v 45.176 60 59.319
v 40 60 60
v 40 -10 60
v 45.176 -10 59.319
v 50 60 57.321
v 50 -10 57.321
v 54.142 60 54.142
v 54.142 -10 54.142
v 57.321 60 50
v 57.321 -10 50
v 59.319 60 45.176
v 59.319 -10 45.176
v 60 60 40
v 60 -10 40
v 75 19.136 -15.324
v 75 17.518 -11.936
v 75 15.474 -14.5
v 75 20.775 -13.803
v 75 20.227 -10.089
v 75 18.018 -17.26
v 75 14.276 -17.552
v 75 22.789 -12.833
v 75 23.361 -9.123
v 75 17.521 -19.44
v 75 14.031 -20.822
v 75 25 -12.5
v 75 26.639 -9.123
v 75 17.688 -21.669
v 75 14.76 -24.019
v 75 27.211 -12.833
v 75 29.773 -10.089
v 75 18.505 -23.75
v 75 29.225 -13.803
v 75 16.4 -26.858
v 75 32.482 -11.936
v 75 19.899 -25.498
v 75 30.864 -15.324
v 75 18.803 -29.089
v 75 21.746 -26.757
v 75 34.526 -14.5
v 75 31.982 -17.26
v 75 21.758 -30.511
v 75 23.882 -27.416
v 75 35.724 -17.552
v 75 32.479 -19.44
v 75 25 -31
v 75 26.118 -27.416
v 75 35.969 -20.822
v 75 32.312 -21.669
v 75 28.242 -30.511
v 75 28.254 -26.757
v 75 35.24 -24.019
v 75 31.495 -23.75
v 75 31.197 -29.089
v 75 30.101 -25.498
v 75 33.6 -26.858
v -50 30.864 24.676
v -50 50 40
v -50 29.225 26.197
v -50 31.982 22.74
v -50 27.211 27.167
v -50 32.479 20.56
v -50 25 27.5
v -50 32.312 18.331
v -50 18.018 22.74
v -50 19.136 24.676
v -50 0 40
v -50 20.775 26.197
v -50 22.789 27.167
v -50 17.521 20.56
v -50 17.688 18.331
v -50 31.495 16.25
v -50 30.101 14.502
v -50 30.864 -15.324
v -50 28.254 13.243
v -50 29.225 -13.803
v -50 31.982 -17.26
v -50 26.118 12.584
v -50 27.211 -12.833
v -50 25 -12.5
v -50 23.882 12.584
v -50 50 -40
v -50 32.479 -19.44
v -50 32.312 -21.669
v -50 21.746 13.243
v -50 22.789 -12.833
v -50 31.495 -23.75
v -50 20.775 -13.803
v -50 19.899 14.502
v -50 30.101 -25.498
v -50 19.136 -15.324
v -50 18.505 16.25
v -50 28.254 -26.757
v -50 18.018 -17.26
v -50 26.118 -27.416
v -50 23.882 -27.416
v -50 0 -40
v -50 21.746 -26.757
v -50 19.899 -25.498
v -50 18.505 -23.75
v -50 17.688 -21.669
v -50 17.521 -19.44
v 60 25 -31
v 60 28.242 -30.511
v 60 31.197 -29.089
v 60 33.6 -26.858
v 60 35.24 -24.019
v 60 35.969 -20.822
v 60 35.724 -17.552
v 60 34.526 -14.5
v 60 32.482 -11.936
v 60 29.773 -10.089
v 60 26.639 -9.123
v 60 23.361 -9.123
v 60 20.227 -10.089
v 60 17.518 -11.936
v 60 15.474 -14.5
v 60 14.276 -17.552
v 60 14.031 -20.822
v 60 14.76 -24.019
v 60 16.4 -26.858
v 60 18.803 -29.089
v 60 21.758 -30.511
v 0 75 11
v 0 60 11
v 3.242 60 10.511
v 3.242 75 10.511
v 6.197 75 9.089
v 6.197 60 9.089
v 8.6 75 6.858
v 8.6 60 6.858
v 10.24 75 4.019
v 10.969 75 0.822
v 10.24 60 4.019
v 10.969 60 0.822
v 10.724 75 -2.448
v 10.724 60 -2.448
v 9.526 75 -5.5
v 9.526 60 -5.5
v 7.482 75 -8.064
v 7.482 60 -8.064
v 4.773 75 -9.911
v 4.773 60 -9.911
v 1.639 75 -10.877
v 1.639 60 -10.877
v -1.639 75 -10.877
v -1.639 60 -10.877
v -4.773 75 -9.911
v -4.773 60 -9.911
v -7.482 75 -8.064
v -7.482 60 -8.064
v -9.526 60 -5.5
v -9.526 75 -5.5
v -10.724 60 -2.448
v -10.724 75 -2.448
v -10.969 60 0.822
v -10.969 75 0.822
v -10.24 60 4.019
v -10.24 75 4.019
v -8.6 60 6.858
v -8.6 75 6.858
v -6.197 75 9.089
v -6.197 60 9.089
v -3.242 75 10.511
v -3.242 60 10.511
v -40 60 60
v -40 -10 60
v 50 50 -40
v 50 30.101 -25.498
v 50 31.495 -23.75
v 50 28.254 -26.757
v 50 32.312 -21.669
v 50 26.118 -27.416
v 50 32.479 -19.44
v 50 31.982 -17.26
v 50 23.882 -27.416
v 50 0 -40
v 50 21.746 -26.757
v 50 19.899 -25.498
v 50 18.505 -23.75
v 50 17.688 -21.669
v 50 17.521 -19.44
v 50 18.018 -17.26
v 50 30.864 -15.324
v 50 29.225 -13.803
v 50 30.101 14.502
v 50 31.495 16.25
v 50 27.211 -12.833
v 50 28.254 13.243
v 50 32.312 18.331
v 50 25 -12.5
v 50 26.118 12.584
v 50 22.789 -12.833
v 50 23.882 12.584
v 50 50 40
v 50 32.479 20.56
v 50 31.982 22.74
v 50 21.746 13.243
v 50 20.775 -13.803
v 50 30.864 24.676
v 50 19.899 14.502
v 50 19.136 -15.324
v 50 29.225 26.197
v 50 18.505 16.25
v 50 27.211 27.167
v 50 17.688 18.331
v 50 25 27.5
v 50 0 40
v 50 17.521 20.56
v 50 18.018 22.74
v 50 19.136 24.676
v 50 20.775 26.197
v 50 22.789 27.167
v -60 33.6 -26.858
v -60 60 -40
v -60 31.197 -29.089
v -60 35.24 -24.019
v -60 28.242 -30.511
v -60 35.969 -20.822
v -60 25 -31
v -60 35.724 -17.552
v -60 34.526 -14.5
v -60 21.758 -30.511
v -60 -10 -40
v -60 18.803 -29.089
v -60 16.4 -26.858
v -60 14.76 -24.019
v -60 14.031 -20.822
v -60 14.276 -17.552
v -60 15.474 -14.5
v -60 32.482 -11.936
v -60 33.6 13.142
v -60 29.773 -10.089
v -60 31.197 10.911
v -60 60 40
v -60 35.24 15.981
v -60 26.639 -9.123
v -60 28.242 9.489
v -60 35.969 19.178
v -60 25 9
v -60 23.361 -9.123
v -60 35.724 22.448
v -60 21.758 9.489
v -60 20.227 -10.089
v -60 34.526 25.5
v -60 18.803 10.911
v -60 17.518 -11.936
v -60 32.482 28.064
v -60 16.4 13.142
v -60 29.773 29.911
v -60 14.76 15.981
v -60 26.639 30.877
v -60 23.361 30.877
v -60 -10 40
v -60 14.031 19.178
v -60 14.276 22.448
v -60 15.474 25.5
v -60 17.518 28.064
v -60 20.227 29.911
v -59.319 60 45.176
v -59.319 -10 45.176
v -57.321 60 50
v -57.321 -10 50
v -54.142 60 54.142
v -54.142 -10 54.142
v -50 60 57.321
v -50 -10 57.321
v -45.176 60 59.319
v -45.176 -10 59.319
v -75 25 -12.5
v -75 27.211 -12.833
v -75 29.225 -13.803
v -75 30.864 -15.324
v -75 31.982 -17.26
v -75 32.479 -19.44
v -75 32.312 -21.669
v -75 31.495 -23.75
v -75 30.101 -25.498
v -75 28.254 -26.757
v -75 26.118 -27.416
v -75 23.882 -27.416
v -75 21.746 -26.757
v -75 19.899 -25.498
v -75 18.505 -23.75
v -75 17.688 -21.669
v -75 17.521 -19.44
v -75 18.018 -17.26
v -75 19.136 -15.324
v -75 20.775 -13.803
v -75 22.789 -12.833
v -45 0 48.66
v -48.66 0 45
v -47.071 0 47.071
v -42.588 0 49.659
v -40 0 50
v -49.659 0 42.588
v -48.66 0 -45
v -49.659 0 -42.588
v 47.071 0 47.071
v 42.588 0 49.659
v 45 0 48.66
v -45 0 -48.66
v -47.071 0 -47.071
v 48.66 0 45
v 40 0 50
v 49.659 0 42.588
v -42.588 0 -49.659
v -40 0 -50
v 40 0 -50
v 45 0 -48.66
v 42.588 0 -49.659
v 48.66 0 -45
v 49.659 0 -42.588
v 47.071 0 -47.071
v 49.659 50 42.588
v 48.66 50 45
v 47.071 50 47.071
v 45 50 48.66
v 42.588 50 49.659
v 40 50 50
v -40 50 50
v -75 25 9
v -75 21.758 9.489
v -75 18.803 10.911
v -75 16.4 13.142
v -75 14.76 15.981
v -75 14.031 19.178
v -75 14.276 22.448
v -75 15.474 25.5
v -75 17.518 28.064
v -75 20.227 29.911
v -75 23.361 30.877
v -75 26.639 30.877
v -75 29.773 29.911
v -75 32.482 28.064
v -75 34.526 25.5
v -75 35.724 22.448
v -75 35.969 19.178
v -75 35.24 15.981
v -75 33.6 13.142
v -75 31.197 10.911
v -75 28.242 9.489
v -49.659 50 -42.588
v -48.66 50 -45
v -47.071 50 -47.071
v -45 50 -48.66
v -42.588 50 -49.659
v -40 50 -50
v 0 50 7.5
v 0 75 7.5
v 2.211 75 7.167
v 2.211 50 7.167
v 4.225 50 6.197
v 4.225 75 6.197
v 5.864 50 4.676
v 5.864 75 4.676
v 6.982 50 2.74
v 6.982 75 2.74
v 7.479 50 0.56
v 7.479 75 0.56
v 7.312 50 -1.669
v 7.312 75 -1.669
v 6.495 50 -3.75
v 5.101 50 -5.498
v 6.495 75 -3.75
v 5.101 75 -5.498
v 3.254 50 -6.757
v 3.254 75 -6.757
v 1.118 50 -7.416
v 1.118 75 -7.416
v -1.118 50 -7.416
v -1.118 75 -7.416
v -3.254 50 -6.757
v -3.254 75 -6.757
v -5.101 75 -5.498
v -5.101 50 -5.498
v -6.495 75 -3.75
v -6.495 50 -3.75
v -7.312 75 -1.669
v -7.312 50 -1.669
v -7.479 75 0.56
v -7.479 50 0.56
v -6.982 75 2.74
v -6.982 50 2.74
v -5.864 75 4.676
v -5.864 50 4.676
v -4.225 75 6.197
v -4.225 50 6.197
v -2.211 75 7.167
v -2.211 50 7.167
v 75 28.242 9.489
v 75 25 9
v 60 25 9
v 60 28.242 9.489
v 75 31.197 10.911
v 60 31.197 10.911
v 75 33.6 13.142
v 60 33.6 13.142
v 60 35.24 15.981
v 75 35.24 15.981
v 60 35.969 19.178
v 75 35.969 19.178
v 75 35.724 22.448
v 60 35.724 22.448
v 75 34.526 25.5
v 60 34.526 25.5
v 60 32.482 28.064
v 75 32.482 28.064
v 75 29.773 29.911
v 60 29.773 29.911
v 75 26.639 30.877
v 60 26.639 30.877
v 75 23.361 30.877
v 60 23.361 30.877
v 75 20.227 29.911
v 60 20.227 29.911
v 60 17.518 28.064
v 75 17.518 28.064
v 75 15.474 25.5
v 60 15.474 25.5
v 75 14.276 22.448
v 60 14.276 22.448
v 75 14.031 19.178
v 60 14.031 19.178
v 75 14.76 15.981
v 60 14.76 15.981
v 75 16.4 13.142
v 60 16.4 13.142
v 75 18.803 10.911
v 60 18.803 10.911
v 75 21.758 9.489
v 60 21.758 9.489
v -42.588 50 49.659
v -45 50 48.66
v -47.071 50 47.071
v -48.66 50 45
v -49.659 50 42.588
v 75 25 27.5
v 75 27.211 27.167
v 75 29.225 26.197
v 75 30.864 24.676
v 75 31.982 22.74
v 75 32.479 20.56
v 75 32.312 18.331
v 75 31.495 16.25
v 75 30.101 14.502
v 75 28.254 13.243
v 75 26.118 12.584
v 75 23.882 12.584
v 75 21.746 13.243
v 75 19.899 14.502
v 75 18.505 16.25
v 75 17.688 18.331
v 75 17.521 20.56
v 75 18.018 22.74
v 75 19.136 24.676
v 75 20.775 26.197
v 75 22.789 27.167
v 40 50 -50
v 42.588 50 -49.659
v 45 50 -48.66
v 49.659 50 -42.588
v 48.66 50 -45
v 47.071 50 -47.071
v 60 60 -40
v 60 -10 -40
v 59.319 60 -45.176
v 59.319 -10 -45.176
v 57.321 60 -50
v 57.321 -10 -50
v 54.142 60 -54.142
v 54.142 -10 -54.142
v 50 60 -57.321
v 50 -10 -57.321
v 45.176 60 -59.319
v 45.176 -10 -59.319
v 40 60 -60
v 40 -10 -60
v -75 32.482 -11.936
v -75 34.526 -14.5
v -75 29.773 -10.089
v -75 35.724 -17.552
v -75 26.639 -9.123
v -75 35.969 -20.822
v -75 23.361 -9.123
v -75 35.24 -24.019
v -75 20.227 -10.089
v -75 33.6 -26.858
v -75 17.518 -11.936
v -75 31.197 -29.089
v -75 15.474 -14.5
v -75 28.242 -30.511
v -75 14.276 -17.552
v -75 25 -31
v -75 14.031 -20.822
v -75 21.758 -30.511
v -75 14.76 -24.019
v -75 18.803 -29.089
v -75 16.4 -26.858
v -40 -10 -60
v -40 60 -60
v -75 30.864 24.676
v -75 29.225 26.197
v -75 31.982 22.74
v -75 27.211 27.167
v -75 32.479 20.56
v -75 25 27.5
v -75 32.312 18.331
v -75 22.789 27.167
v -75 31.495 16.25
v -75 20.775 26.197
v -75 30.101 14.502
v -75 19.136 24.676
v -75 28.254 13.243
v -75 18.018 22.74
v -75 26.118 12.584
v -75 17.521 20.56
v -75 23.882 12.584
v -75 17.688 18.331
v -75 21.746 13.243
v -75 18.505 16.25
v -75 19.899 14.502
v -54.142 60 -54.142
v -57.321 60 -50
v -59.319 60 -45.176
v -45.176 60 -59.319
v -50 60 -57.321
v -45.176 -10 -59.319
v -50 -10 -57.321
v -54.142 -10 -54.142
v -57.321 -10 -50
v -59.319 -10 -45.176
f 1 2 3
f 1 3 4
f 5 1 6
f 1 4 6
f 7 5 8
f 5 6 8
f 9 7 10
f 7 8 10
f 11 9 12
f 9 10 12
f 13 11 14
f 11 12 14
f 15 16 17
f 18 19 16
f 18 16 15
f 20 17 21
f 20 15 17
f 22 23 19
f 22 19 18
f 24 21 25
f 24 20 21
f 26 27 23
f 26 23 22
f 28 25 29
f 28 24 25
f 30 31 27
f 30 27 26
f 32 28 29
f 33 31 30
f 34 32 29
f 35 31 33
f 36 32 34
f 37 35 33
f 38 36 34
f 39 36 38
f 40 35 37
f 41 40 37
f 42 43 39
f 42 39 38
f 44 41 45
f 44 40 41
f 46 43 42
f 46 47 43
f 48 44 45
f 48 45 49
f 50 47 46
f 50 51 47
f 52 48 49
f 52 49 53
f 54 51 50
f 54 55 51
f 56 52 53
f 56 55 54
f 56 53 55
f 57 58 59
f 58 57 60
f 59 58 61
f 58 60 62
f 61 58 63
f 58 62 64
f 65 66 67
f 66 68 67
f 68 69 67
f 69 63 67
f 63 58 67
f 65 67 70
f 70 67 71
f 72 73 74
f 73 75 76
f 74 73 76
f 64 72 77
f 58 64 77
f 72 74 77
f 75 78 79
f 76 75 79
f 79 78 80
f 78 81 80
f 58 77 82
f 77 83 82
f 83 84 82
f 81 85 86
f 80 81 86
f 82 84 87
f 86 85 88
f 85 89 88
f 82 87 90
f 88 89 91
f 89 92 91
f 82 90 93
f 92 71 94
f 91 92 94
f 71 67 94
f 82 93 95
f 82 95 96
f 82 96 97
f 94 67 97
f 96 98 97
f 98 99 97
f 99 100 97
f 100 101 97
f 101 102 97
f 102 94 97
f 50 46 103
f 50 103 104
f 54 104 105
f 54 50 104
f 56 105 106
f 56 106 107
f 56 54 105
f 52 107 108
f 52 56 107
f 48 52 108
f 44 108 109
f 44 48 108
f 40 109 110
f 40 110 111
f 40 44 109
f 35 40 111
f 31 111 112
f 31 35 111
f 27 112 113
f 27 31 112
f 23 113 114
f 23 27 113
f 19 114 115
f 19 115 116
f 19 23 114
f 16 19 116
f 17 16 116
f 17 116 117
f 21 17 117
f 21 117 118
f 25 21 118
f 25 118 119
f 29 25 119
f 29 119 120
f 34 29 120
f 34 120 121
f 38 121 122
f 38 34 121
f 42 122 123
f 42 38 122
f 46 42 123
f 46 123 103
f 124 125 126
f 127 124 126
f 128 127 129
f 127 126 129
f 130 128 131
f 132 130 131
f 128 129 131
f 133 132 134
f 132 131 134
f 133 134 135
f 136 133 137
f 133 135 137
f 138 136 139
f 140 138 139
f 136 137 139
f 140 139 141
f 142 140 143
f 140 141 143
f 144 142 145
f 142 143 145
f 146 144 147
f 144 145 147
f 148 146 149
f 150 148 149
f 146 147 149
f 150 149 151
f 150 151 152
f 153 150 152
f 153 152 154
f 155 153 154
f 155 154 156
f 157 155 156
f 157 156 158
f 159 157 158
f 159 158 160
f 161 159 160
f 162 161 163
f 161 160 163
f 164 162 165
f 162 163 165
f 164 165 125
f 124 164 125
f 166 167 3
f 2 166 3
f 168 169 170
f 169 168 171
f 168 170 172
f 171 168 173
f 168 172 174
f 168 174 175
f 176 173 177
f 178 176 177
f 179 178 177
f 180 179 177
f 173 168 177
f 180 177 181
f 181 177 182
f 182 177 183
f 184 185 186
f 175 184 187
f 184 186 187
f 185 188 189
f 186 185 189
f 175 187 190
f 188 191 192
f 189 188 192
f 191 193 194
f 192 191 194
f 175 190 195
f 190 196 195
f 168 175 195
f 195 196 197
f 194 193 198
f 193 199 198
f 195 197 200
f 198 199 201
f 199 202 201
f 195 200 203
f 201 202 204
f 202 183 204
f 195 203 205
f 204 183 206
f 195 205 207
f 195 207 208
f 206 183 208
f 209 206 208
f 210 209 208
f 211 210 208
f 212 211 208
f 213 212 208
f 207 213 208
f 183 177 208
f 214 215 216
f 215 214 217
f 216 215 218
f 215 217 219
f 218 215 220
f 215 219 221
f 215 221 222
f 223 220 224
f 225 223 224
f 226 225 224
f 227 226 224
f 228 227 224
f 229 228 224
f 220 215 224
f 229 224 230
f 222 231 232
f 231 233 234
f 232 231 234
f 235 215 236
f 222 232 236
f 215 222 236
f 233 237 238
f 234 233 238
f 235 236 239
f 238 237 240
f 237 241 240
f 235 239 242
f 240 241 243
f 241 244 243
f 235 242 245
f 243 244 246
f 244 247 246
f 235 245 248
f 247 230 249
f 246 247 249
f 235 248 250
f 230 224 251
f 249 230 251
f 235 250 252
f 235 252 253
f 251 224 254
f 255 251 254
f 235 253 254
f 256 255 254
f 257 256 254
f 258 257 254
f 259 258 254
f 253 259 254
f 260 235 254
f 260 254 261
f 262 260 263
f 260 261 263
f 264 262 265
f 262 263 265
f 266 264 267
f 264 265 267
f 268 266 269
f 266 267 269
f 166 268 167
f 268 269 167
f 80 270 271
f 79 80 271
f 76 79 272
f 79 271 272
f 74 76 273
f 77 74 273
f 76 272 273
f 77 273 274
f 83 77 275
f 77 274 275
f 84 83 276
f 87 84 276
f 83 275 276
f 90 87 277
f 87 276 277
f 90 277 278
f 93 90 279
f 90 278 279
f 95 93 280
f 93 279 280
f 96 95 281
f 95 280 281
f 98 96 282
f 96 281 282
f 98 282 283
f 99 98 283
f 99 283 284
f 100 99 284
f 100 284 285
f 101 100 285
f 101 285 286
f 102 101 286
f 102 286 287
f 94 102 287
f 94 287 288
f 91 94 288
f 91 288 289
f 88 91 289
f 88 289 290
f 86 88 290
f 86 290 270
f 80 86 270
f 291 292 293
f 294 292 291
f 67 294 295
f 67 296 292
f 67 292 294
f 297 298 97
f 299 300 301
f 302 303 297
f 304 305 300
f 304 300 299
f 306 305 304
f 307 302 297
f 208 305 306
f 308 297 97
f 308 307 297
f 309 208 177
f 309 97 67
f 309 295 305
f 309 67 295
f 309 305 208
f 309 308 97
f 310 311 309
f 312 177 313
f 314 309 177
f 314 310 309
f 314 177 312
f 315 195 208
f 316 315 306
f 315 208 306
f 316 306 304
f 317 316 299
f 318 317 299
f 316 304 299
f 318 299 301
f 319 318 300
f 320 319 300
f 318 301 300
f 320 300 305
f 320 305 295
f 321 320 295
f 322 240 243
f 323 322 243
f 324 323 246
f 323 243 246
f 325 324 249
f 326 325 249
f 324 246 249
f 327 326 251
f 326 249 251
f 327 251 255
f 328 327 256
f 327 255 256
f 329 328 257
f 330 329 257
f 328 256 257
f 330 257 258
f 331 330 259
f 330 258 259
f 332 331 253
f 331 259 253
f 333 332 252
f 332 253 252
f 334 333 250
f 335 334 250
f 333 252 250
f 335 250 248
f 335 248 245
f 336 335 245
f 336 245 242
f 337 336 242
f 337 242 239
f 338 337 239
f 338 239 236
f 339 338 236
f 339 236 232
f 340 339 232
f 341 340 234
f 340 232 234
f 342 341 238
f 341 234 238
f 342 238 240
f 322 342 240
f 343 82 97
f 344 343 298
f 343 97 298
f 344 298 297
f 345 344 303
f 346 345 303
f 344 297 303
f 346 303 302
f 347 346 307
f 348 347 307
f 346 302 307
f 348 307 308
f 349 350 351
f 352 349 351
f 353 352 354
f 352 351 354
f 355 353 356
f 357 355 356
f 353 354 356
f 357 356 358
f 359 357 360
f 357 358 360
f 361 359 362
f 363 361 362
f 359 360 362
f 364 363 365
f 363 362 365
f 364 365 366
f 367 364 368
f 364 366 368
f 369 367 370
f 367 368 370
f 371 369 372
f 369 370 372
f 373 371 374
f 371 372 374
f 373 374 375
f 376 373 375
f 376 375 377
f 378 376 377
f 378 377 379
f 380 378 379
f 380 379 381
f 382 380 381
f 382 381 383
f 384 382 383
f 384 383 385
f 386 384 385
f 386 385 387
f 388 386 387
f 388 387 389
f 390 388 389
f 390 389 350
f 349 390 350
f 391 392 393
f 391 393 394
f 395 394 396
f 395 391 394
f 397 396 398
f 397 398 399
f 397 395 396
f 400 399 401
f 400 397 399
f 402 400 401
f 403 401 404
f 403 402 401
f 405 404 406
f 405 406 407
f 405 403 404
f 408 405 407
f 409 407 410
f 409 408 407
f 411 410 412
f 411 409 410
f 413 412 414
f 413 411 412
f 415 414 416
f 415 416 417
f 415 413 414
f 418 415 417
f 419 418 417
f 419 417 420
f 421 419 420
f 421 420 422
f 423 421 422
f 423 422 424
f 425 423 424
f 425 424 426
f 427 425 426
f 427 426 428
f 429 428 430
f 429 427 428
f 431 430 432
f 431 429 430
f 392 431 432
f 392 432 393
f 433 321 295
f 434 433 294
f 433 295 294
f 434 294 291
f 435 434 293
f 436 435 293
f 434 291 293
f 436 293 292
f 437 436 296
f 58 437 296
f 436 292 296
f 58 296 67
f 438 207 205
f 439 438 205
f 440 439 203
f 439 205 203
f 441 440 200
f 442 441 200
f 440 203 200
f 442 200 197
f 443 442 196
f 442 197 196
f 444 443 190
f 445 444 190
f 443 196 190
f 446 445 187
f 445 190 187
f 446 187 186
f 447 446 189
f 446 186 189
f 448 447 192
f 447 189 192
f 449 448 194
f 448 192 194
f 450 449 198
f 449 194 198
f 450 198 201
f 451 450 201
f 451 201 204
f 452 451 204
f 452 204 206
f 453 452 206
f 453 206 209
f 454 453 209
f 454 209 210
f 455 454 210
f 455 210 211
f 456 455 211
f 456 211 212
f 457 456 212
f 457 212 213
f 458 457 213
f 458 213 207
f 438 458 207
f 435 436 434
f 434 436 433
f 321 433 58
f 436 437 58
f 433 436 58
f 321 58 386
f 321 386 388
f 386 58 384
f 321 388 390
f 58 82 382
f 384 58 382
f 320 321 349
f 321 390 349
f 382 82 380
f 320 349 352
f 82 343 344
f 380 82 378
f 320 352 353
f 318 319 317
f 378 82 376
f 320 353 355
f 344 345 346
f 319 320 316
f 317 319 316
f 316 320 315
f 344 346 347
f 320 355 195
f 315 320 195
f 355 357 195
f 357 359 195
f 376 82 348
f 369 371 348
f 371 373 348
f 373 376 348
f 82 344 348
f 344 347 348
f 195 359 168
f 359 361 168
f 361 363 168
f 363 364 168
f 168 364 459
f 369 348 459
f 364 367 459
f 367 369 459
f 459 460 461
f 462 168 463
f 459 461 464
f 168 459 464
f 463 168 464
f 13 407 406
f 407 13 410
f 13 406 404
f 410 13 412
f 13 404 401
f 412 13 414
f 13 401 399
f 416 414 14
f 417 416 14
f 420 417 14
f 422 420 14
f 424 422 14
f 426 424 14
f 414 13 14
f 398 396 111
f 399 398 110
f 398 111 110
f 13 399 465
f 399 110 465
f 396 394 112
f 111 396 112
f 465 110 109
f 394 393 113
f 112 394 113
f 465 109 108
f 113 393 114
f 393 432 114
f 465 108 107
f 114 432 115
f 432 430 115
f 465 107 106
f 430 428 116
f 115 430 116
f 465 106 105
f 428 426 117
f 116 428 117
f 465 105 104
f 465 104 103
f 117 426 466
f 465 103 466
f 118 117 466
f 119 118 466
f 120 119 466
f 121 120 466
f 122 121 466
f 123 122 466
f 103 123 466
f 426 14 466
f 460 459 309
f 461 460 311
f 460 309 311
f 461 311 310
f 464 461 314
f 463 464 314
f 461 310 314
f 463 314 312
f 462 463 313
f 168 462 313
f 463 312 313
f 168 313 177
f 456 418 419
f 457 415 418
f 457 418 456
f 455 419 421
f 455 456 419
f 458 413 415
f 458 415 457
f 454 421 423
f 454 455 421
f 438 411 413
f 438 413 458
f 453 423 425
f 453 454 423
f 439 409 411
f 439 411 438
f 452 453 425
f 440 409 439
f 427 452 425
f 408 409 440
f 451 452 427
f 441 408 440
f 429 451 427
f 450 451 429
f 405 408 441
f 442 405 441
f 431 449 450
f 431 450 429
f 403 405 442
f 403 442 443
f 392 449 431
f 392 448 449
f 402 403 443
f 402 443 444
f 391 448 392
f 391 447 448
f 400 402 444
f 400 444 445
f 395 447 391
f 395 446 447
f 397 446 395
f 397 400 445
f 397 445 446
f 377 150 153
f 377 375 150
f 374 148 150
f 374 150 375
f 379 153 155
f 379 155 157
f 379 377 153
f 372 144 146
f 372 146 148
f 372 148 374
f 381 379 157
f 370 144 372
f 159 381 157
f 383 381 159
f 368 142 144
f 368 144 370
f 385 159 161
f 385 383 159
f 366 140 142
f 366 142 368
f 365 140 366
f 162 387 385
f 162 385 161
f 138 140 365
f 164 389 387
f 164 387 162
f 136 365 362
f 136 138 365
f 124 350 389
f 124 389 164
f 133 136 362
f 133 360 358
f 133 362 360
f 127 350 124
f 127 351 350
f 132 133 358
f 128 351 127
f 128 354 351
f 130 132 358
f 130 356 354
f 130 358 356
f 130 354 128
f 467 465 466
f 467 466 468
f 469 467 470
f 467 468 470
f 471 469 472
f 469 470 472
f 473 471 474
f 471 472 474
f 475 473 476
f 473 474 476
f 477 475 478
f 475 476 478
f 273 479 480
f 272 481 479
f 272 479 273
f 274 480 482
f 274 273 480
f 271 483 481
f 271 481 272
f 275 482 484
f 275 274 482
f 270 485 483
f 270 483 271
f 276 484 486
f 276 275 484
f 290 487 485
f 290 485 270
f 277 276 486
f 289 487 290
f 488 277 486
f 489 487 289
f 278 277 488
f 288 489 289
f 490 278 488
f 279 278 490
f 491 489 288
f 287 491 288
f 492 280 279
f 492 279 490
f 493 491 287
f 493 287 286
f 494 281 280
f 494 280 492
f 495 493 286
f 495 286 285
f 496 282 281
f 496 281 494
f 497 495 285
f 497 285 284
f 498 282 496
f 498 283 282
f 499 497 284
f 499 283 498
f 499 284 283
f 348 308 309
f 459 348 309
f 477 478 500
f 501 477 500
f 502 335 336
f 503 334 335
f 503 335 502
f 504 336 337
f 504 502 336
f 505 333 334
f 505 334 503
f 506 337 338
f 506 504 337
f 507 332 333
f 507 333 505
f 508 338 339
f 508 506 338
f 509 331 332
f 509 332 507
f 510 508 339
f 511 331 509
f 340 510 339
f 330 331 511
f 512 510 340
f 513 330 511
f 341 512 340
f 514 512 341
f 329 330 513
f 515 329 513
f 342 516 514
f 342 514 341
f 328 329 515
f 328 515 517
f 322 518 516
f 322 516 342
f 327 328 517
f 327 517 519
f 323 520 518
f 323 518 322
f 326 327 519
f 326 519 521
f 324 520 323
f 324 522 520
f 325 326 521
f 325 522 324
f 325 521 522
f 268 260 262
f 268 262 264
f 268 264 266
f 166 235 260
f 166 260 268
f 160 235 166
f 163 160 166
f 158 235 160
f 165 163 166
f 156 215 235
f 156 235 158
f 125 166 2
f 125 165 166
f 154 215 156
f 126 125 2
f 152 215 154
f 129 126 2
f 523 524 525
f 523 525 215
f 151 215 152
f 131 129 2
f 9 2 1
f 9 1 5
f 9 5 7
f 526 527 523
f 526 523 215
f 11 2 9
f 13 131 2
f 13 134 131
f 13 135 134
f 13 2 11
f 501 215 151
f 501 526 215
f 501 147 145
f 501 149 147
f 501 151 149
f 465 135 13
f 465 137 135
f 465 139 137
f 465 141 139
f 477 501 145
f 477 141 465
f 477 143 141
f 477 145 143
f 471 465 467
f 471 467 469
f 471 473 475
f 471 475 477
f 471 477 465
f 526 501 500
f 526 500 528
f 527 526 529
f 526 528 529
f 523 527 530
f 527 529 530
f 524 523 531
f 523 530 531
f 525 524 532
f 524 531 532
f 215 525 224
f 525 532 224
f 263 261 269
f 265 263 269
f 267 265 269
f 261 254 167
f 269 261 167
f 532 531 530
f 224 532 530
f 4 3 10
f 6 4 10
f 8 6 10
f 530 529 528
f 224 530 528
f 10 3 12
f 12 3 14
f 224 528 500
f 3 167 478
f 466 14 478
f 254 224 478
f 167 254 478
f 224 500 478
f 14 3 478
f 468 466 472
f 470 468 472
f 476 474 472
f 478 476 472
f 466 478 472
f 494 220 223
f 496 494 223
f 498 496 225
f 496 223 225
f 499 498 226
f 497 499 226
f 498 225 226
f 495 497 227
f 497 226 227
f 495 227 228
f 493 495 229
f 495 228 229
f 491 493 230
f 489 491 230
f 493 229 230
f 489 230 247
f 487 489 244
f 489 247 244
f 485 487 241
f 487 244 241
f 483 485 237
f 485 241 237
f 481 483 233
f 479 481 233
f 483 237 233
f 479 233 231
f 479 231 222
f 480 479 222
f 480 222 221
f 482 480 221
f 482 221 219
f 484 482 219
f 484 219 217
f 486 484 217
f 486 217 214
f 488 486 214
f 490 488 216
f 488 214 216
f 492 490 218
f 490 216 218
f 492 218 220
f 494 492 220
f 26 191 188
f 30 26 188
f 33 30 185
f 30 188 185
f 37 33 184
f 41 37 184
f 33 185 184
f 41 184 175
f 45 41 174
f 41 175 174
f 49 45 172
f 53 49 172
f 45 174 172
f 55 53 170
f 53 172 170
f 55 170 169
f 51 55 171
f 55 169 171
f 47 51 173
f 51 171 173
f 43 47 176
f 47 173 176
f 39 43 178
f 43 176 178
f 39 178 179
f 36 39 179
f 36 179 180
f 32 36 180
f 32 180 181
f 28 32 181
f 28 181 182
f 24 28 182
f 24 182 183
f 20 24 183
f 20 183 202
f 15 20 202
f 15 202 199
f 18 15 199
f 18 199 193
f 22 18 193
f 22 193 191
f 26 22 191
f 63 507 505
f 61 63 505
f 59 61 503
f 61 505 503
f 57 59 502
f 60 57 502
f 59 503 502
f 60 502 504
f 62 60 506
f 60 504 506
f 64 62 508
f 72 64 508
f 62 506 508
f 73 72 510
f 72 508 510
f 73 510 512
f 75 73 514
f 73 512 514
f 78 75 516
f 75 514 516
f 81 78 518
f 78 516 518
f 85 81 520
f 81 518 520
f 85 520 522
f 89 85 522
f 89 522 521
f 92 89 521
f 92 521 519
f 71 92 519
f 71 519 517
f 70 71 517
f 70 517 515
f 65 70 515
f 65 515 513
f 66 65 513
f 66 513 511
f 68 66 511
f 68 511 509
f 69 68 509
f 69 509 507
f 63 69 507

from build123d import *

# Parameters (mm, degrees)
RESSALTO_EXTRUS_O1_DEPTH = 50
RESSALTO_EXTRUS_O2_DEPTH = 10
RESSALTO_EXTRUS_O3_START = 10
RESSALTO_EXTRUS_O3_DEPTH = 10
ESBO_O4_R                = 11
RESSALTO_EXTRUS_O4_DEPTH = 15
RESSALTO_EXTRUS_O5_START = 15
ESBO_O5_R                = 11
RESSALTO_EXTRUS_O5_DEPTH = 15
ESBO_O6_R                = 7.5
CORTE_EXTRUS_O1_DEPTH    = 200
ESBO_O7_R                = 11
RESSALTO_EXTRUS_O6_DEPTH = 15
ESBO_O8_R                = 7.5
CORTE_EXTRUS_O2_DEPTH    = 30


with BuildPart() as part:
    # Esboço1 → Ressalto-extrusão1 (new body)
    with BuildSketch(Plane(origin=(0, 0, 0), x_dir=(1, 0, 0), z_dir=(0, 1, 0))):
        with BuildLine():
            Line((40, 60), (-40, 60))
            ThreePointArc((-40, 60), (-54.142135624, 54.142135624), (-60, 40))
            Line((-60, 40), (-60, -40))
            ThreePointArc((-60, -40), (-54.142135624, -54.142135624), (-40, -60))
            Line((-40, -60), (40, -60))
            ThreePointArc((40, -60), (54.142135624, -54.142135624), (60, -40))
            Line((60, -40), (60, 40))
            ThreePointArc((60, 40), (54.142135624, 54.142135624), (40, 60))
        make_face()
        with BuildLine():
            Line((40, -50), (-40, -50))
            ThreePointArc((-40, -50), (-47.071067812, -47.071067812), (-50, -40))
            Line((-50, -40), (-50, 40))
            ThreePointArc((-50, 40), (-47.071067812, 47.071067812), (-40, 50))
            Line((-40, 50), (40, 50))
            ThreePointArc((40, 50), (47.071067812, 47.071067812), (50, 40))
            Line((50, 40), (50, -40))
            ThreePointArc((50, -40), (47.071067812, -47.071067812), (40, -50))
        make_face(mode=Mode.SUBTRACT)
    extrude(amount=RESSALTO_EXTRUS_O1_DEPTH)

    # Esboço2 → Ressalto-extrusão2 (add)
    with BuildSketch(Plane(origin=(0, 50, 0), x_dir=(1, 0, 0), z_dir=(0, 1, 0))):
        with BuildLine():
            Line((-40, -60), (40, -60))
            ThreePointArc((40, -60), (54.142135624, -54.142135624), (60, -40))
            Line((60, -40), (60, 40))
            ThreePointArc((60, 40), (54.142135624, 54.142135624), (40, 60))
            Line((40, 60), (-40, 60))
            ThreePointArc((-40, 60), (-54.142135624, 54.142135624), (-60, 40))
            Line((-60, 40), (-60, -40))
            ThreePointArc((-60, -40), (-54.142135624, -54.142135624), (-40, -60))
        make_face()
    extrude(amount=RESSALTO_EXTRUS_O2_DEPTH)

    # Esboço3 → Ressalto-extrusão3 (add)
    with BuildSketch(Plane(origin=(0, 0, 0), x_dir=(-1, 0, 0), z_dir=(0, -1, 0)).offset(RESSALTO_EXTRUS_O3_START)):
        with BuildLine():
            Line((40, -60), (-40, -60))
            ThreePointArc((-40, -60), (-54.142135624, -54.142135624), (-60, -40))
            Line((-60, -40), (-60, 40))
            ThreePointArc((-60, 40), (-54.142135624, 54.142135624), (-40, 60))
            Line((-40, 60), (40, 60))
            ThreePointArc((40, 60), (54.142135624, 54.142135624), (60, 40))
            Line((60, 40), (60, -40))
            ThreePointArc((60, -40), (54.142135624, -54.142135624), (40, -60))
        make_face()
    extrude(amount=-RESSALTO_EXTRUS_O3_DEPTH)

    # Esboço4 → Ressalto-extrusão4 (add)
    with BuildSketch(Plane.ZY.offset(60)):
        with Locations(Location((20, 25, 0), (0, 0, 180))):
            Circle(ESBO_O4_R)
        with Locations(Location((-20, 25, 0), (0, 0, 180))):
            Circle(ESBO_O4_R)
    extrude(amount=RESSALTO_EXTRUS_O4_DEPTH)

    # Esboço5 → Ressalto-extrusão5 (add)
    with BuildSketch(Plane(origin=(60, 0, 0), x_dir=(0, 0, -1), z_dir=(1, 0, 0)).offset(RESSALTO_EXTRUS_O5_START)):
        with Locations((-20, 25)):
            Circle(ESBO_O5_R)
        with Locations((20, 25)):
            Circle(ESBO_O5_R)
    extrude(amount=-RESSALTO_EXTRUS_O5_DEPTH)

    # Esboço6 → Corte-extrusão1 (cut)
    with BuildSketch(Plane.ZY.offset(75)):
        with Locations((20, 25)):
            Circle(ESBO_O6_R)
        with Locations((-20, 25)):
            Circle(ESBO_O6_R)
    extrude(amount=-CORTE_EXTRUS_O1_DEPTH, mode=Mode.SUBTRACT)

    # Esboço7 → Ressalto-extrusão6 (add)
    with BuildSketch(Plane(origin=(0, 60, 0), x_dir=(1, 0, 0), z_dir=(0, 1, 0))):
        with Locations(Location((0, 0, 0), (0, 0, 270))):
            Circle(ESBO_O7_R)
    extrude(amount=RESSALTO_EXTRUS_O6_DEPTH)

    # Esboço8 → Corte-extrusão2 (cut)
    with BuildSketch(Plane(origin=(0, 75, 0), x_dir=(1, 0, 0), z_dir=(0, 1, 0))):
        with Locations(Location((0, 0, 0), (0, 0, 270))):
            Circle(ESBO_O8_R)
    extrude(amount=-CORTE_EXTRUS_O2_DEPTH, mode=Mode.SUBTRACT)


solid = part.part
